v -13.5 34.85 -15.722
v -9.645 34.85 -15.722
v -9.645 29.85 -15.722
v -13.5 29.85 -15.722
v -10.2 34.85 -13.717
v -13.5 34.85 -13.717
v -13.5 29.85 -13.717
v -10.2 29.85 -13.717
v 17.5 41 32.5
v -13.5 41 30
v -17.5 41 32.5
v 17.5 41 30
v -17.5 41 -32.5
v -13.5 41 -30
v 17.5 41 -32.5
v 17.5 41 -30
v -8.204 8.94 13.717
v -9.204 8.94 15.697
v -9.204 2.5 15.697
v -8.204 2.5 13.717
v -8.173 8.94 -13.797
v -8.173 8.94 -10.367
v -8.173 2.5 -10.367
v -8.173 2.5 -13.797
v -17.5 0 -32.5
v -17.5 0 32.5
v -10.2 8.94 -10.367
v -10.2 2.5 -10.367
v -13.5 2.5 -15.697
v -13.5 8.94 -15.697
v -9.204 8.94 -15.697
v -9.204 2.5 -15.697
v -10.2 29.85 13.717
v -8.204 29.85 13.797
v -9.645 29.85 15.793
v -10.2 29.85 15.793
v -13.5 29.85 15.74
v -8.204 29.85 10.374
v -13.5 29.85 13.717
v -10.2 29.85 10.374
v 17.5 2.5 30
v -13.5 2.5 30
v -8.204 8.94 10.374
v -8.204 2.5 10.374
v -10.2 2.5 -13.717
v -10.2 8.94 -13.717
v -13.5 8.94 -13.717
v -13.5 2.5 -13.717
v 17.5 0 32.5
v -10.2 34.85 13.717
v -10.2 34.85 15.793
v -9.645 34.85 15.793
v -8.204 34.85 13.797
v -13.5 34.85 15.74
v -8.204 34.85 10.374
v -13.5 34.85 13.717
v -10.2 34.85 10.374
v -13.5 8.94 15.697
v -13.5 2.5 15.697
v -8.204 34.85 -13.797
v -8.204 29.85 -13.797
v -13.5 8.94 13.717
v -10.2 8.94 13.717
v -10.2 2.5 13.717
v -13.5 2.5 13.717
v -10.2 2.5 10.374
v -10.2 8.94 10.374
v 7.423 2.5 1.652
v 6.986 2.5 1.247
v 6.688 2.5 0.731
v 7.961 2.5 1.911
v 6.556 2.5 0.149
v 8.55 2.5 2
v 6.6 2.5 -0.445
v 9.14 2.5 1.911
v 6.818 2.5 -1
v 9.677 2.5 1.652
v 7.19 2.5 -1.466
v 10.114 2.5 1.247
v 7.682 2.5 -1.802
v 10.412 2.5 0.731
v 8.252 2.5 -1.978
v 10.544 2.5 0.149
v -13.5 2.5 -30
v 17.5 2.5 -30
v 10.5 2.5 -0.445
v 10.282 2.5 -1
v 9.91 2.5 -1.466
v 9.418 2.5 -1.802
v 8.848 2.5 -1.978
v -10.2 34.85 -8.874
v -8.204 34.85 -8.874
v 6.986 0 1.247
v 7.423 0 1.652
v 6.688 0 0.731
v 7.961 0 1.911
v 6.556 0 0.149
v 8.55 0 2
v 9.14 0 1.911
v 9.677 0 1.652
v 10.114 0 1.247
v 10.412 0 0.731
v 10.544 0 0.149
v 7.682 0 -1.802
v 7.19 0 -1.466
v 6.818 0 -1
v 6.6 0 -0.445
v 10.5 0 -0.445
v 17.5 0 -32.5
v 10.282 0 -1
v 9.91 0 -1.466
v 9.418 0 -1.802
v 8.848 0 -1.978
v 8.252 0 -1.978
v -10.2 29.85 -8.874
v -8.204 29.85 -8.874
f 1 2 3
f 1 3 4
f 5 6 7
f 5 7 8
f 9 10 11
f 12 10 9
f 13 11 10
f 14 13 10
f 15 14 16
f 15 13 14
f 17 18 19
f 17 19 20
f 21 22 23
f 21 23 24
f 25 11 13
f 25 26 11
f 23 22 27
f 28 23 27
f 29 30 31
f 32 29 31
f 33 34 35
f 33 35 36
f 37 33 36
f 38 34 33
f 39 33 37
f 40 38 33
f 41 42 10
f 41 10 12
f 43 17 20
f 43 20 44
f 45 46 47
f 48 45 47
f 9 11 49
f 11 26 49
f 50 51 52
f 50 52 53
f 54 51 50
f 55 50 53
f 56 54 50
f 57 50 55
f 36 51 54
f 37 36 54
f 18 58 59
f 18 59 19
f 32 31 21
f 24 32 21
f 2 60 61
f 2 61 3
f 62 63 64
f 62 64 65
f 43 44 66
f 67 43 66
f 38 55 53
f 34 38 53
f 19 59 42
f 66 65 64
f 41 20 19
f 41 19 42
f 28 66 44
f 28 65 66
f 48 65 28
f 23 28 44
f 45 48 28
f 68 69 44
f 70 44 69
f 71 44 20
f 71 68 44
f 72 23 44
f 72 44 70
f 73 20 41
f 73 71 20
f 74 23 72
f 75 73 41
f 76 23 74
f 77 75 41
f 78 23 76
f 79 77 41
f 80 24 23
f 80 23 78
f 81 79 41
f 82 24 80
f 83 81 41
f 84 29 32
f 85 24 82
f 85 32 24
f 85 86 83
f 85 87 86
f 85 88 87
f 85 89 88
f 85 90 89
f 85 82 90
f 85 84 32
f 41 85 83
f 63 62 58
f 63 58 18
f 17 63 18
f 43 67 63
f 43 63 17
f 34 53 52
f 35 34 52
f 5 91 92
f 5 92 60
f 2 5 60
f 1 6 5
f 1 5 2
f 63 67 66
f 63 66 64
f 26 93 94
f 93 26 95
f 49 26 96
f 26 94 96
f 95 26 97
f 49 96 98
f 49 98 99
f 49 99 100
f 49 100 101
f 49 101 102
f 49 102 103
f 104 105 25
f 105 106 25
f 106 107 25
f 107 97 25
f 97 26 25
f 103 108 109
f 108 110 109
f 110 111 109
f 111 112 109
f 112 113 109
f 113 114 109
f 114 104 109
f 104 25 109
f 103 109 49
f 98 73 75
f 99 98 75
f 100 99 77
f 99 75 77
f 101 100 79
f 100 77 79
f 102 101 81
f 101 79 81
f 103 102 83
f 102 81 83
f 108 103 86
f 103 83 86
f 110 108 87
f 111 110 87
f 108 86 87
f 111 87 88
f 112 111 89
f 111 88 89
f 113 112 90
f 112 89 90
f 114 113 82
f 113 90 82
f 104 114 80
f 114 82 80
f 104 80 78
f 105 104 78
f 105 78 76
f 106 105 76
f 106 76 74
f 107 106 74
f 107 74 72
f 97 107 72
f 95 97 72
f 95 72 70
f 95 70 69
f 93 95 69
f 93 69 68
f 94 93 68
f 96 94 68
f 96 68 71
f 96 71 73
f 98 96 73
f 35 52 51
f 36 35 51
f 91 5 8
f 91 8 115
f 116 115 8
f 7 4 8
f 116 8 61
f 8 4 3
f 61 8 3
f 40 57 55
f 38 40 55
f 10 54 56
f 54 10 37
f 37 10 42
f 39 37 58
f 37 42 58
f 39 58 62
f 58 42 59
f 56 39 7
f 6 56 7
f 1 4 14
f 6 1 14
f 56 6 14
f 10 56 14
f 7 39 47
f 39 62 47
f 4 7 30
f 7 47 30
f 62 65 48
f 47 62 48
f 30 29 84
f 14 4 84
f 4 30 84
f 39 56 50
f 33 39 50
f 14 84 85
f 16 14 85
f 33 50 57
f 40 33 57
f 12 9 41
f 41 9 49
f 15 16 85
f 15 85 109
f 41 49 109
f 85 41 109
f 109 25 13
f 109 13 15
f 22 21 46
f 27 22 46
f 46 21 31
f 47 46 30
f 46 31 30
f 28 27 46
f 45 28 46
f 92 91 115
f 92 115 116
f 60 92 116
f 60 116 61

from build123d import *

# Parameters (mm, degrees)
SKETCH1_W           = 35
SKETCH1_H           = 65
BOSS_EXTRUDE1_DEPTH = 2.5
SKETCH2_W           = 4
SKETCH2_H           = 65
BOSS_EXTRUDE2_DEPTH = 38.5
SKETCH3_W           = 31
SKETCH3_H           = 2.5
BOSS_EXTRUDE4_DEPTH = 38.5
BOSS_EXTRUDE6_DEPTH = 11.15
SKETCH15_R          = 2
CUT_EXTRUDE3_DEPTH  = 5
CUT_EXTRUDE6_DEPTH  = 7
BOSS_EXTRUDE7_DEPTH = 6.44


with BuildPart() as part:
    # Sketch1 → Boss-Extrude1 (new body)
    with BuildSketch(Plane(origin=(0, 0, 0), x_dir=(1, 0, 0), z_dir=(0, 1, 0))):
        Rectangle(SKETCH1_W, SKETCH1_H)
    extrude(amount=BOSS_EXTRUDE1_DEPTH)

    # Sketch2 → Boss-Extrude2 (add)
    with BuildSketch(Plane(origin=(0, 2.5, 0), x_dir=(1, 0, 0), z_dir=(0, 1, 0))):
        with Locations((-15.5, 0)):
            Rectangle(SKETCH2_W, SKETCH2_H)
    extrude(amount=BOSS_EXTRUDE2_DEPTH)

    # Sketch3 → Boss-Extrude4 (add)
    with BuildSketch(Plane(origin=(0, 2.5, 0), x_dir=(1, 0, 0), z_dir=(0, 1, 0))):
        with Locations((2, 31.25)):
            Rectangle(SKETCH3_W, SKETCH3_H)
        with Locations((2, -31.25)):
            Rectangle(SKETCH3_W, SKETCH3_H)
    extrude(amount=BOSS_EXTRUDE4_DEPTH)

    # Sketch12 → Boss-Extrude6 (add)
    with BuildSketch(Plane(origin=(0, 41, 0), x_dir=(1, 0, 0), z_dir=(0, 1, 0))):
        Polygon((-8.203844825, -13.796665784), (-9.645047449, -15.79282096), (-10.2, -15.79282096), (-13.5, -15.740186096), (-13.5, -13.717271913), (-10.2, -13.717271913), (-10.2, -10.374022399), (-8.203844825, -10.374022399), align=None)
        Polygon((-13.5, 13.717271913), (-10.2, 13.717271913), (-10.2, 8.874022399), (-8.203844825, 8.874022399), (-8.203844825, 13.796665784), (-9.645047449, 15.721544213), (-13.5, 15.721544213), align=None)
    extrude(amount=-BOSS_EXTRUDE6_DEPTH)

    # Sketch15 → Cut-Extrude3 (cut)
    with BuildSketch(Plane(origin=(0, 2.5, 0), x_dir=(1, 0, 0), z_dir=(0, 1, 0))):
        with Locations(Location((8.550066744, 0, 0), (0, 0, 270))):
            Circle(SKETCH15_R)
    extrude(amount=-CUT_EXTRUDE3_DEPTH, mode=Mode.SUBTRACT)

    # Sketch13 → Cut-Extrude6 (cut)
    with BuildSketch(Plane(origin=(-13.5, 0, 0), x_dir=(0, 0, -1), z_dir=(1, 0, 0))):
        Polygon((-15.719309169, 34.85), (-19.050762409, 34.85), (-19.050762409, 41), (-15.740186096, 41), (21.565915306, 41), (24.332393972, 41), (24.332393972, 34.85), (21.565915306, 34.85), align=None)
    extrude(amount=CUT_EXTRUDE6_DEPTH, mode=Mode.SUBTRACT)

    # Sketch7 → Boss-Extrude7 (add)
    with BuildSketch(Plane(origin=(0, 2.5, 0), x_dir=(1, 0, 0), z_dir=(0, 1, 0))):
        Polygon((-13.5, 13.717271913), (-13.5, 15.696799482), (-9.20372121, 15.696799482), (-8.173305913, 13.796665784), (-8.173305913, 11.874022399), (-8.173305913, 10.367152571), (-10.2, 10.367152571), (-10.2, 13.717271913), align=None)
        Polygon((-13.5, -13.717271913), (-13.5, -15.696799482), (-9.20372121, -15.696799482), (-8.203759602, -13.717271913), (-8.203759602, -10.374022403), (-10.2, -10.374022403), (-10.2, -13.717271913), align=None)
    extrude(amount=BOSS_EXTRUDE7_DEPTH)


solid = part.part
